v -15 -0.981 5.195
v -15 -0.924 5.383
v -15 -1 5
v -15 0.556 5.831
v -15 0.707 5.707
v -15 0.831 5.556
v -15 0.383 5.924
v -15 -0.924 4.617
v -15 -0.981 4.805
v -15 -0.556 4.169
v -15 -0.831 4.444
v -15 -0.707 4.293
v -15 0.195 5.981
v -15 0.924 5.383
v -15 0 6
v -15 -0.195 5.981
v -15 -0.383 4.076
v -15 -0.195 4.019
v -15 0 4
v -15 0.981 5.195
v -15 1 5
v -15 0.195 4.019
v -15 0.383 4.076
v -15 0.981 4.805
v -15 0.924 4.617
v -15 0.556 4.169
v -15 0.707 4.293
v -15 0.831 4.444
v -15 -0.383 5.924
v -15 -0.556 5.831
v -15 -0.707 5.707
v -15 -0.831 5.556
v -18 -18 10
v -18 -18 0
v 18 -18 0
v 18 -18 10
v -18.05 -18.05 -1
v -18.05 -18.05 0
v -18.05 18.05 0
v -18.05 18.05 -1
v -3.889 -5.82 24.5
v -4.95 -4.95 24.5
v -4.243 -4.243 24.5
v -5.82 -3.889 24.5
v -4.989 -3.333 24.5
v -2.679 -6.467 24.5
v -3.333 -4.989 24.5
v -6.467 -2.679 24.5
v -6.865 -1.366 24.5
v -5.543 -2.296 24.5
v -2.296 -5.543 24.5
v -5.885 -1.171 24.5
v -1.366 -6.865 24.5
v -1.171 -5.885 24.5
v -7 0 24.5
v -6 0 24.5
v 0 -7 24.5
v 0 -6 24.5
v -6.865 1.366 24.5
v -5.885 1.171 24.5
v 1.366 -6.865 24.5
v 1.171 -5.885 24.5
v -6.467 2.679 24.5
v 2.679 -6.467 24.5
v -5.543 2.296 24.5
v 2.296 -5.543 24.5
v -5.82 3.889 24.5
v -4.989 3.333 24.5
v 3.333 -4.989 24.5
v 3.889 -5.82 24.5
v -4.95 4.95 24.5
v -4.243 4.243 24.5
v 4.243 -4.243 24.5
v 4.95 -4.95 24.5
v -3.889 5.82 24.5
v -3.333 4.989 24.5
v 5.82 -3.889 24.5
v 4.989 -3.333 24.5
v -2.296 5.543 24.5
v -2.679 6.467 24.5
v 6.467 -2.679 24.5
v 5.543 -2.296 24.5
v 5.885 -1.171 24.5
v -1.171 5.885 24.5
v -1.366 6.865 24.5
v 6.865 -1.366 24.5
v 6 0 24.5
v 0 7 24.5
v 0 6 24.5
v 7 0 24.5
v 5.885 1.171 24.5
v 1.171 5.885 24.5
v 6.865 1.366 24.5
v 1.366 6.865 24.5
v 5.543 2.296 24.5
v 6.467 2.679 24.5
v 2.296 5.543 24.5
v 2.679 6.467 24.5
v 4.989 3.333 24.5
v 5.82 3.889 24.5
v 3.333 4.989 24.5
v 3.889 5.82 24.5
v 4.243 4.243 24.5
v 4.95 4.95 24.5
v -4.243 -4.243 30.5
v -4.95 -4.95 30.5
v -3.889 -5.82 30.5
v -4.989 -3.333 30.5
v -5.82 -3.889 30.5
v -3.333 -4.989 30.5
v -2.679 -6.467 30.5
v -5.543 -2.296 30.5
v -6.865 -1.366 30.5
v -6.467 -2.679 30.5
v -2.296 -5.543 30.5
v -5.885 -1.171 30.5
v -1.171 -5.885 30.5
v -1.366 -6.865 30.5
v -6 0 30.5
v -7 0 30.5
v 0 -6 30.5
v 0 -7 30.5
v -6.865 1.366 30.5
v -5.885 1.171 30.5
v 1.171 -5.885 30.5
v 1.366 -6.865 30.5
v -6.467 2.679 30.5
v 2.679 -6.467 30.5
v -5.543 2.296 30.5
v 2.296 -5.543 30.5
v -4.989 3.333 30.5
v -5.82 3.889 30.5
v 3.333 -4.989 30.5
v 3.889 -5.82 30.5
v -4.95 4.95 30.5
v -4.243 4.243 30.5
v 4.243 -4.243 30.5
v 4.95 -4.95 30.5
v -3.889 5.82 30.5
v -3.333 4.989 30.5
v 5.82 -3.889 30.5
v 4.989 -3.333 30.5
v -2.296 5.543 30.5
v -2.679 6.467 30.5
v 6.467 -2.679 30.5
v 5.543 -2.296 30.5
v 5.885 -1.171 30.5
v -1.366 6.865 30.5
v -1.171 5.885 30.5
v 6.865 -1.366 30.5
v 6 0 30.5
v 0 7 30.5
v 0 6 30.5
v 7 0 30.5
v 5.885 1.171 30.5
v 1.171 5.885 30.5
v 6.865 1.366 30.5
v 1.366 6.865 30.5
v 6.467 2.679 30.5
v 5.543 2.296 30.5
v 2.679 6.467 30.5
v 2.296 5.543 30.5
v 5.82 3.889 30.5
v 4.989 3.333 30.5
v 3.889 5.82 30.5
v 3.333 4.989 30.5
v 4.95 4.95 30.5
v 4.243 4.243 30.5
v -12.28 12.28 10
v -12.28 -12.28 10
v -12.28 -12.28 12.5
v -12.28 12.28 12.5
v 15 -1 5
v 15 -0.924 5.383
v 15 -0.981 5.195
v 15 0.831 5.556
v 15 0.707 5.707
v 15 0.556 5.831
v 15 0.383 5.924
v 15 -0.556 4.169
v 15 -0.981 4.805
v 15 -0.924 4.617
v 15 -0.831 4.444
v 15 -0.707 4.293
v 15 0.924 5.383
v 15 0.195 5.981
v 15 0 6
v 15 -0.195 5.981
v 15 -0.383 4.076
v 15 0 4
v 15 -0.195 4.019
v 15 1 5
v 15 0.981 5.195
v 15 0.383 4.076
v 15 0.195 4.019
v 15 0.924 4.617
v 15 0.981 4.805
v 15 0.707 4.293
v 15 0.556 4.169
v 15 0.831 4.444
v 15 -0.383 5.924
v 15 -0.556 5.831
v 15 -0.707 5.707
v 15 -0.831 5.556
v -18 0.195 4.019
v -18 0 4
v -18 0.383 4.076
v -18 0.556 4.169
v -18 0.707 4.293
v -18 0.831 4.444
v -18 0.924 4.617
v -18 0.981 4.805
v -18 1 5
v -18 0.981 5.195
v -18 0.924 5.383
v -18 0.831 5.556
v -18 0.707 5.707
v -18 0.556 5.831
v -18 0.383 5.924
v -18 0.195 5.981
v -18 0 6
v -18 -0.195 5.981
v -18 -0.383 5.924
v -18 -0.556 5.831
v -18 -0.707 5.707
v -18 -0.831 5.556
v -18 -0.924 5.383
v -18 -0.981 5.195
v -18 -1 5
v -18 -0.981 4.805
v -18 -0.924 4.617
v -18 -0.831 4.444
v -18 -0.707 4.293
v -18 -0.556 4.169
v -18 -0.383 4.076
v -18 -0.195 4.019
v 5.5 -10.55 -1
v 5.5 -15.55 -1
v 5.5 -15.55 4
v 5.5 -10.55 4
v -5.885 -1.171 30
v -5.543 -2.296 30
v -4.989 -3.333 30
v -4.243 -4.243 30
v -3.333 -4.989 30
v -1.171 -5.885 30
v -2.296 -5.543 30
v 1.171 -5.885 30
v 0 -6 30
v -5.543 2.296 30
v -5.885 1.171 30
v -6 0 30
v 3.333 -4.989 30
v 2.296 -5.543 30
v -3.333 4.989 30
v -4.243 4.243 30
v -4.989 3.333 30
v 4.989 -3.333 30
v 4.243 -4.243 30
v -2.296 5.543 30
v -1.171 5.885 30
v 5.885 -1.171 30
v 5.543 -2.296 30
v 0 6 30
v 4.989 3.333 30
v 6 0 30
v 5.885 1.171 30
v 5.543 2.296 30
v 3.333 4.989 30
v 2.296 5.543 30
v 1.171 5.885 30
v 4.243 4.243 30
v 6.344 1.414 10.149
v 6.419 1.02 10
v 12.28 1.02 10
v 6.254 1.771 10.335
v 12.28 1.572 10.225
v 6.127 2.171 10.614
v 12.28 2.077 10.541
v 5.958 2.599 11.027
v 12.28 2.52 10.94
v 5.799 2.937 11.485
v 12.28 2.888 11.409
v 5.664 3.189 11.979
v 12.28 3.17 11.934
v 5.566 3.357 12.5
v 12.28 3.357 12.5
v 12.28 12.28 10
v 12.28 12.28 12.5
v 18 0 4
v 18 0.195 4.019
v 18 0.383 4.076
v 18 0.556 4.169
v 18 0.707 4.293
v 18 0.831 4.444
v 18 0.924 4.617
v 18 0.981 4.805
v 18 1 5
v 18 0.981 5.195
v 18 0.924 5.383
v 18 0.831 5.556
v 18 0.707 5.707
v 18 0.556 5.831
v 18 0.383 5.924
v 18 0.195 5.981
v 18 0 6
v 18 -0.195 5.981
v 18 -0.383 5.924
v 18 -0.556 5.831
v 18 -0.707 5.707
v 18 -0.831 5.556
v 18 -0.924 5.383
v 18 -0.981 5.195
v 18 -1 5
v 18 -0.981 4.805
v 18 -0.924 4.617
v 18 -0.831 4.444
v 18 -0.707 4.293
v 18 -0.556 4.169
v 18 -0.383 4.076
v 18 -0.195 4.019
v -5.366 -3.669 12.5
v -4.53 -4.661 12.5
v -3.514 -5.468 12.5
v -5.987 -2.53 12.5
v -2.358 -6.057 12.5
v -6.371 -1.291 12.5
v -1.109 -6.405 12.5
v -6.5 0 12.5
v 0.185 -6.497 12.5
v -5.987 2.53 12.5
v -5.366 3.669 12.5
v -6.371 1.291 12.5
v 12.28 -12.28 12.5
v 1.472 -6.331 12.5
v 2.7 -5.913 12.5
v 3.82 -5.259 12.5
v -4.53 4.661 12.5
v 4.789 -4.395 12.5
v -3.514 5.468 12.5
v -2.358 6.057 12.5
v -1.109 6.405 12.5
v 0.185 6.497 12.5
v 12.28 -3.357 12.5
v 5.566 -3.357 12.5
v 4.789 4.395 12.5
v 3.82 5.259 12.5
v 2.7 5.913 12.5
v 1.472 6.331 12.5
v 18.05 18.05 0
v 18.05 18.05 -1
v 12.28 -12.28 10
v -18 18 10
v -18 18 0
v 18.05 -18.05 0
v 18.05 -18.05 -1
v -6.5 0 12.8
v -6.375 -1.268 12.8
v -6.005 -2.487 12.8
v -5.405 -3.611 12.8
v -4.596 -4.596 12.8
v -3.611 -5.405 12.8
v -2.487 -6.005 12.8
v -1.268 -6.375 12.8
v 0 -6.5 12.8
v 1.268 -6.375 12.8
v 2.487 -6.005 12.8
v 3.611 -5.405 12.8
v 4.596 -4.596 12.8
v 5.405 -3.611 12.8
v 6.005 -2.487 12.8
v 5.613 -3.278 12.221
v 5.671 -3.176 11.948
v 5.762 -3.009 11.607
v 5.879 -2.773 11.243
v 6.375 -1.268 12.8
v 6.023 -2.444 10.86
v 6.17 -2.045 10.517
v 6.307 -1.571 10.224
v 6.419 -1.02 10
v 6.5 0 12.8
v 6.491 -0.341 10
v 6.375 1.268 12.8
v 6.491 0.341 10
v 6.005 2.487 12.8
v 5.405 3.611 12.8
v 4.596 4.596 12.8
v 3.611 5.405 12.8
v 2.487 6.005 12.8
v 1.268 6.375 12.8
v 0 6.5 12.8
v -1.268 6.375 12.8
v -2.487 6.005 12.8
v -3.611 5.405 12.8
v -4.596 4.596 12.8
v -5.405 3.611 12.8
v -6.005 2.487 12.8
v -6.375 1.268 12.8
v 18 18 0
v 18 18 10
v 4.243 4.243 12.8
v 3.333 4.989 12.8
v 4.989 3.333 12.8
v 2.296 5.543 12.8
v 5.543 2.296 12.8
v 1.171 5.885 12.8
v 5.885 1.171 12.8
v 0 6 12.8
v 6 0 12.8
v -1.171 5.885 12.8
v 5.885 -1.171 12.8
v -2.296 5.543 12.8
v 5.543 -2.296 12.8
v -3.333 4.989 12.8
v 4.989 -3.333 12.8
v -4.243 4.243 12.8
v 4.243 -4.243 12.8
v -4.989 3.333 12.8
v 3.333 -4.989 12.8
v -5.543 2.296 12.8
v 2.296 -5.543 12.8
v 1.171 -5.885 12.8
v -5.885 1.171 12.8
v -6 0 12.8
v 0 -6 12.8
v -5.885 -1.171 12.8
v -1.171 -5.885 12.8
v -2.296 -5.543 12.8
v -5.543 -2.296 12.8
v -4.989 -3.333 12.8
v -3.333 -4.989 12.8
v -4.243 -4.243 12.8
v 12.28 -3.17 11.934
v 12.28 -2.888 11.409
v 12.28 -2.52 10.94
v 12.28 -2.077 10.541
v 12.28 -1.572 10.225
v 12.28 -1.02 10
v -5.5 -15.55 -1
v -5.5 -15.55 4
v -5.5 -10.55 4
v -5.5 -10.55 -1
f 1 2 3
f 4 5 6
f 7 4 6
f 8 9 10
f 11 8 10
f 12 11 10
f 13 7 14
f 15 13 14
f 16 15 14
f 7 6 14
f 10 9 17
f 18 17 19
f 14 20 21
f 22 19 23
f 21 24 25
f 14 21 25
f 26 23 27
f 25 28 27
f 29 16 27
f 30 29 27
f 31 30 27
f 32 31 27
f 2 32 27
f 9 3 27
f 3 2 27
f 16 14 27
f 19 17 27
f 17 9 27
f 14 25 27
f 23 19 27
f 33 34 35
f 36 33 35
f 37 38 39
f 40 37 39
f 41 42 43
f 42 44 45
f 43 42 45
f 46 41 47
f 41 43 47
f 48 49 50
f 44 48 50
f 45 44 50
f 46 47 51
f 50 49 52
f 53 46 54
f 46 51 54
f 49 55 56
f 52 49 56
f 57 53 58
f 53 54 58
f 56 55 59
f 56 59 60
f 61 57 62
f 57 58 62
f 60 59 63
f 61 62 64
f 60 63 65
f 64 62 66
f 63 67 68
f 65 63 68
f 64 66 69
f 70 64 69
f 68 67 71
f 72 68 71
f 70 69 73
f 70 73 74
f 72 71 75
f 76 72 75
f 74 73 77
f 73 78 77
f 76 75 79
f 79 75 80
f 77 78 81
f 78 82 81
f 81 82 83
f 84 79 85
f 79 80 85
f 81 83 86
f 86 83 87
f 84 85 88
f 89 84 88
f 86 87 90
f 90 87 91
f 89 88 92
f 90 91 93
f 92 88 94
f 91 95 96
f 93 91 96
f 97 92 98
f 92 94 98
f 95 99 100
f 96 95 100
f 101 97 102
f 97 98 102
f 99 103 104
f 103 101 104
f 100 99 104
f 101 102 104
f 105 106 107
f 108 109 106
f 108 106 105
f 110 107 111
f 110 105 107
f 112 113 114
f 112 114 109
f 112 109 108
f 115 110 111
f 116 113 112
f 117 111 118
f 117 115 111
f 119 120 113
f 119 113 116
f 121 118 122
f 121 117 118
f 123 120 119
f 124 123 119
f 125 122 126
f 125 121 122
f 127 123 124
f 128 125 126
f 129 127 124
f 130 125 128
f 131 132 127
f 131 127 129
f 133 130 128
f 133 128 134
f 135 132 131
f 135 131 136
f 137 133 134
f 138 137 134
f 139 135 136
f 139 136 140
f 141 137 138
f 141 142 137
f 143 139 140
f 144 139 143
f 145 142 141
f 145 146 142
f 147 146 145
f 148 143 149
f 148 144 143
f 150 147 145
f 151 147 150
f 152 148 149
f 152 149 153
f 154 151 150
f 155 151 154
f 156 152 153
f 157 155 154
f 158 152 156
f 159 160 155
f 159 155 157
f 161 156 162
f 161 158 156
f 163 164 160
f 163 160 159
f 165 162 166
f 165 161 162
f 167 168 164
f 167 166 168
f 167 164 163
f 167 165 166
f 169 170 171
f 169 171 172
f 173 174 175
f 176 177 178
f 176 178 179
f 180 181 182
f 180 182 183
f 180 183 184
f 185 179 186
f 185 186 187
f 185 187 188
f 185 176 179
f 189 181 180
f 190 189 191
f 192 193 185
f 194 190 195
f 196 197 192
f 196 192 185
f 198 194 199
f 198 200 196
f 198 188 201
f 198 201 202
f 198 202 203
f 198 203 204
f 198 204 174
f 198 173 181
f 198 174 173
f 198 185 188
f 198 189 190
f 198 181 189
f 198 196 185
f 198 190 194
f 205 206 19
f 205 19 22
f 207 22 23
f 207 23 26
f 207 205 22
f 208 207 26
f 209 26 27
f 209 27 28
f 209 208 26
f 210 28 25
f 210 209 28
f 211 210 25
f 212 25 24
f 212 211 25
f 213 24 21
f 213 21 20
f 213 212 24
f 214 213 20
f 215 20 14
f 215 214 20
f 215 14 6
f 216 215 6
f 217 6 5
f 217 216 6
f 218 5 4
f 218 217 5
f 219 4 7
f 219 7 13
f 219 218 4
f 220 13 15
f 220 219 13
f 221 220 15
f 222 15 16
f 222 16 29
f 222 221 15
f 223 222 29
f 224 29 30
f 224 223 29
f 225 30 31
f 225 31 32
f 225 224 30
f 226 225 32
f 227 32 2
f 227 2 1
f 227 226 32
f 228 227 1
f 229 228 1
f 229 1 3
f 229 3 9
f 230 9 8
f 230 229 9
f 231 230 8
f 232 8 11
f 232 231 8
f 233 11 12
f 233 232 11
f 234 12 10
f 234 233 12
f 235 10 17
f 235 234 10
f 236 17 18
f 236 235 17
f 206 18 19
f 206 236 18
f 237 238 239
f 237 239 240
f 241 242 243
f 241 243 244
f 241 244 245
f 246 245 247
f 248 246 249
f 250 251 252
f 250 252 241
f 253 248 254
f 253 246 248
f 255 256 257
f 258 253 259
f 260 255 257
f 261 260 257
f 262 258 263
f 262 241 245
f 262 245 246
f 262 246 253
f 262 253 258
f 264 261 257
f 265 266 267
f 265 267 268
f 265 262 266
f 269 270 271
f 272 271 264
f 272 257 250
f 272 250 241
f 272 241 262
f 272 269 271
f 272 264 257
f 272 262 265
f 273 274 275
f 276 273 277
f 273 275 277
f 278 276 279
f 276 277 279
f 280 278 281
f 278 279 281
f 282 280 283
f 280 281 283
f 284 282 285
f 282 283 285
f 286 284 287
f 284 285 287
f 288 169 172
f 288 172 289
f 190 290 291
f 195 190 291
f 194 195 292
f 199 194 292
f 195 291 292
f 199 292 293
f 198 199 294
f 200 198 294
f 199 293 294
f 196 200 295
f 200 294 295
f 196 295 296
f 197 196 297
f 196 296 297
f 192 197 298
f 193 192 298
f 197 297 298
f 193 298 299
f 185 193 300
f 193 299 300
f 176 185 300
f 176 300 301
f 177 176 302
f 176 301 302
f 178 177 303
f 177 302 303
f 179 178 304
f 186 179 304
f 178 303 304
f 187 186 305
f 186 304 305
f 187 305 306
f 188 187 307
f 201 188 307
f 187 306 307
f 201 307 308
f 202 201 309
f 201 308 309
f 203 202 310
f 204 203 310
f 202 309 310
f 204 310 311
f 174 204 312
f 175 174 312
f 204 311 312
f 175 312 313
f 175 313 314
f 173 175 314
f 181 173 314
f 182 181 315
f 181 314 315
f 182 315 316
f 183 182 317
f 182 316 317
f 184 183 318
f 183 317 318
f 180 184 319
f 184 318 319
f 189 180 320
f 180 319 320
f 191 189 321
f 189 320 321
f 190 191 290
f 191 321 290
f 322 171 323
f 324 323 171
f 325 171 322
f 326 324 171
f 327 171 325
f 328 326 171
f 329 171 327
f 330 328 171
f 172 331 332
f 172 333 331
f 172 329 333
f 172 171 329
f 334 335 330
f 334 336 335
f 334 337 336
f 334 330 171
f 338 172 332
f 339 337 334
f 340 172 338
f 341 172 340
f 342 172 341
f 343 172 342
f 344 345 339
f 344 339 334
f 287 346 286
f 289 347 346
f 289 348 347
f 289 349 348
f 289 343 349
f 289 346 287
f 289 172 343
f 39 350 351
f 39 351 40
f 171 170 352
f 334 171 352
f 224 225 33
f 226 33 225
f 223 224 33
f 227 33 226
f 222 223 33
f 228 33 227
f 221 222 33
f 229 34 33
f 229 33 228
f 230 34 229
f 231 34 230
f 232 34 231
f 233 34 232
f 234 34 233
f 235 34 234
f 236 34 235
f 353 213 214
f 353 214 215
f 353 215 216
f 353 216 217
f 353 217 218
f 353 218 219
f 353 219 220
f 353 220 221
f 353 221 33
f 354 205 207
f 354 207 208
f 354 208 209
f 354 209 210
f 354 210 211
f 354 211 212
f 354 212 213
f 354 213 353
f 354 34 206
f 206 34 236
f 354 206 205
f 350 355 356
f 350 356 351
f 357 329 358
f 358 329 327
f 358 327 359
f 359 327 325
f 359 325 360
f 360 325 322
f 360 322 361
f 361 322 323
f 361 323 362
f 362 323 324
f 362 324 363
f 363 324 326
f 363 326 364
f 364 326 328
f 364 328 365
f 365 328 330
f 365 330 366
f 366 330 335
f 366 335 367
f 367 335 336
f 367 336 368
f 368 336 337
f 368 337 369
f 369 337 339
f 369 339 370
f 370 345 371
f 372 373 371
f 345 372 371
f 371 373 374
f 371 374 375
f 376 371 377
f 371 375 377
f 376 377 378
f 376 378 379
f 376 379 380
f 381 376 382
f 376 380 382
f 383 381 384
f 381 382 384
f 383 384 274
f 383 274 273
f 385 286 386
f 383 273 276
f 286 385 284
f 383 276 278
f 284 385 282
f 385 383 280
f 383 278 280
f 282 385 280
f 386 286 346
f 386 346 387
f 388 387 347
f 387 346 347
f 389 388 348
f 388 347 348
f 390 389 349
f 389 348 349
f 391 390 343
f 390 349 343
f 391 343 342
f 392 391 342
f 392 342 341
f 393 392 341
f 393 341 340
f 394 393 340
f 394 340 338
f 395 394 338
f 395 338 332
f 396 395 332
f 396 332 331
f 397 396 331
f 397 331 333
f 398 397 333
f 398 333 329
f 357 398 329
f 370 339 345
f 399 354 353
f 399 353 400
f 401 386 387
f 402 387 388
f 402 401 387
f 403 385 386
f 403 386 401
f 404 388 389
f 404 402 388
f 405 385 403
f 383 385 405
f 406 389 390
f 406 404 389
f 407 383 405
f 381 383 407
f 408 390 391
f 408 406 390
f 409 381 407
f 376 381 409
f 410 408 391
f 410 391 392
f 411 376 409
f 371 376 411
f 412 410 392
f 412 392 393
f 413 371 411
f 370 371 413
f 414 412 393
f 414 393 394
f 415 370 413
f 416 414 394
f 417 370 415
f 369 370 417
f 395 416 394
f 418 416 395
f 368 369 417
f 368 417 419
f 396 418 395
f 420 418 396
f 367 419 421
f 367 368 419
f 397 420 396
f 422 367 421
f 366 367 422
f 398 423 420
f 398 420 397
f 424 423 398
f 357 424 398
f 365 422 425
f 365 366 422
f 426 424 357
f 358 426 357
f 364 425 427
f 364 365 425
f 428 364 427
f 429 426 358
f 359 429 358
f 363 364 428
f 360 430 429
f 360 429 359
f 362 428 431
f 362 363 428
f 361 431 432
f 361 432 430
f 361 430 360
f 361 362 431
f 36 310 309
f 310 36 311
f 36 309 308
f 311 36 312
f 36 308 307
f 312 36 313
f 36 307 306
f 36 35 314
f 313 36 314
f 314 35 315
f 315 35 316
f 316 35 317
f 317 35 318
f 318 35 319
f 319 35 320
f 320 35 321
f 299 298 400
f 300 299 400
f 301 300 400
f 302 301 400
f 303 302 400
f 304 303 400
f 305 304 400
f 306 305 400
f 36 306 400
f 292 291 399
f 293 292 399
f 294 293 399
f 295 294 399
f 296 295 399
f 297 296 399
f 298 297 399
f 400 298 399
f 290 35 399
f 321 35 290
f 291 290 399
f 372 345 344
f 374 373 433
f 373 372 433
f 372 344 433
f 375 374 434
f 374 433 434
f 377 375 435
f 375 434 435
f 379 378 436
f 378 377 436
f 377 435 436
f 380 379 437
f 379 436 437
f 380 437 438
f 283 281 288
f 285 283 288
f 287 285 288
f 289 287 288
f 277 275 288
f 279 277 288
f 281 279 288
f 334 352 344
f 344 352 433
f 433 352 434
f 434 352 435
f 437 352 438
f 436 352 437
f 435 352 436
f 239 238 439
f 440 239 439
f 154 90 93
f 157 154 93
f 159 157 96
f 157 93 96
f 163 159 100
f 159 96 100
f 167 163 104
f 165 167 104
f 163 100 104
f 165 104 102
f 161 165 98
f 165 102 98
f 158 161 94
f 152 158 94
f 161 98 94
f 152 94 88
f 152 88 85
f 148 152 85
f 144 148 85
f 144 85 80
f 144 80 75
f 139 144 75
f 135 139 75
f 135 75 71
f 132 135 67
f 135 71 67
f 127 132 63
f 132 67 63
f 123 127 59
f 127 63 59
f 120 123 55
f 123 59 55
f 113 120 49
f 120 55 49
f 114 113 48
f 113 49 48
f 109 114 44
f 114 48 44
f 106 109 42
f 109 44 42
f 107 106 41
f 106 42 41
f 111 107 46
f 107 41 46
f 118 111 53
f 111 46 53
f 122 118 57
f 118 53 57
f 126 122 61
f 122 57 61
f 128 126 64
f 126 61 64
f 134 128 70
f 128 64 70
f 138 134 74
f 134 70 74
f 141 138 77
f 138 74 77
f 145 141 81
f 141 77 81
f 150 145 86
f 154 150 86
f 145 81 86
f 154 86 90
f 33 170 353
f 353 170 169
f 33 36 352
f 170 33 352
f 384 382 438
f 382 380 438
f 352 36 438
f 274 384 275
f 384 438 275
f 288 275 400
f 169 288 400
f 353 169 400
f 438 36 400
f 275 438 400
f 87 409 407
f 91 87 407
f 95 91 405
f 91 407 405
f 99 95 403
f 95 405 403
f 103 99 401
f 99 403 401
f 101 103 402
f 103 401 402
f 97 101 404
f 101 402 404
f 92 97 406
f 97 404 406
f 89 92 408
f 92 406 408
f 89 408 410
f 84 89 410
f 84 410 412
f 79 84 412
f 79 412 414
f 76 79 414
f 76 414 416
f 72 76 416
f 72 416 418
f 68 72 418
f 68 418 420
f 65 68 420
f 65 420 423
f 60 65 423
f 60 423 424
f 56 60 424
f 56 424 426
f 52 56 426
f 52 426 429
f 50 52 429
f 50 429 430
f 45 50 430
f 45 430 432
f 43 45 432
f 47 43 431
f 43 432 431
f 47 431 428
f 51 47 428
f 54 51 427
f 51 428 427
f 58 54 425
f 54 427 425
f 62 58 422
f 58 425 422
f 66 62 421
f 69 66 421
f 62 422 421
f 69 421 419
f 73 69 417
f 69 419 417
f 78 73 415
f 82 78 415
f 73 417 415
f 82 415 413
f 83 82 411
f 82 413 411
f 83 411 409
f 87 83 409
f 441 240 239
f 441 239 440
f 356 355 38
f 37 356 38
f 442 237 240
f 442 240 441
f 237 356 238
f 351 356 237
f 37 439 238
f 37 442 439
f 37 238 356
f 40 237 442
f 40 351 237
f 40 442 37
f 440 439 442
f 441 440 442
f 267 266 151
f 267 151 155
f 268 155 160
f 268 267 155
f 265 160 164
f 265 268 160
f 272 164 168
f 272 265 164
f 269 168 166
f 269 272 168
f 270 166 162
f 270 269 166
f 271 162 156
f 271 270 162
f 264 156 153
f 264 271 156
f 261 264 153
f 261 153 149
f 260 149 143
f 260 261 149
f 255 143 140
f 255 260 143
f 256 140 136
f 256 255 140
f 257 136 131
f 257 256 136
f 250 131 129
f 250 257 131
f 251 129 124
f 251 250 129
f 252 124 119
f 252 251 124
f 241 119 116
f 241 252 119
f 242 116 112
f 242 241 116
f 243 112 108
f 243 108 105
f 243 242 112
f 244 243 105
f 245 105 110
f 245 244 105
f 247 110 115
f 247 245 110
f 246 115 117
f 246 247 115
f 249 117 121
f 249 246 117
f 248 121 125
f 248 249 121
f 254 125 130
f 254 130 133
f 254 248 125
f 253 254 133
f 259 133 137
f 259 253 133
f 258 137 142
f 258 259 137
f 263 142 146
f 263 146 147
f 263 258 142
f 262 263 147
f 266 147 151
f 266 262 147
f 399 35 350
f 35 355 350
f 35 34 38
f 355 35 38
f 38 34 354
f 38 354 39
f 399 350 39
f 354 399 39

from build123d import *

# Parameters (mm, degrees)
SKETCH_1_W               = 36
SKETCH_1_H               = 36
EXTRUDE_1_DEPTH          = 10
SKETCH_2_W               = 24.56
SKETCH_2_H               = 24.56
EXTRUDE_2_DEPTH          = 2.5
SKETCH_3_R               = 6
EXTRUDE_3_DEPTH          = 12
SKETCH_4_R               = 7
EXTRUDE_4_DEPTH          = 6
CUT_EXTRUDE_START        = -0.5
SKETCH_5_R               = 6
CUT_EXTRUDE_1_DEPTH      = 0.5
SKETCH_7_R               = 6.5
EXTRUDE_5_DEPTH          = 0.3
CUT_EXTRUDE_2_REACH      = 48.595
CUT_EXTRUDE_2_END_RADIUS = 6.5
SKETCH_10_R              = 1
CUT_EXTRUDE_3_DEPTH      = 3
SKETCH_11_W              = 36.1
SKETCH_11_H              = 36.1
EXTRUDE_6_DEPTH          = 1
SKETCH_12_W              = 11
SKETCH_12_H              = 5
CUT_EXTRUDE_4_DEPTH      = 5


with BuildPart() as part:
    # 草图1 → 凸台-拉伸1 (new body)
    with BuildSketch(Plane.XY):
        Rectangle(SKETCH_1_W, SKETCH_1_H)
    extrude(amount=EXTRUDE_1_DEPTH)

    # 草图2 → 凸台-拉伸2 (add)
    with BuildSketch(Plane.XY.offset(10)):
        Rectangle(SKETCH_2_W, SKETCH_2_H)
    extrude(amount=EXTRUDE_2_DEPTH)

    # 草图3 → 凸台-拉伸3 (add)
    with BuildSketch(Plane.XY.offset(12.5)):
        Circle(SKETCH_3_R)
    extrude(amount=EXTRUDE_3_DEPTH)

    # 草图4 → 凸台-拉伸4 (add)
    with BuildSketch(Plane.XY.offset(24.5)):
        Circle(SKETCH_4_R)
    extrude(amount=EXTRUDE_4_DEPTH)

    # 草图5 → 切除-拉伸1 (cut)
    with BuildSketch(Plane.XY.offset(30.5).offset(CUT_EXTRUDE_START)):
        Circle(SKETCH_5_R)
    extrude(amount=CUT_EXTRUDE_1_DEPTH, mode=Mode.SUBTRACT)

    # 草图7 → 凸台-拉伸5 (add)
    with BuildSketch(Plane.XY.offset(12.5)):
        with Locations(Location((0, 0, 0), (0, 0, 180))):
            Circle(SKETCH_7_R)
    extrude(amount=EXTRUDE_5_DEPTH)

    # 切除-拉伸2: up to this cylinder (the profile starts outside it)
    cut_extrude_2_end = Plane(origin=(0, 0, 11.416503), z_dir=(0, 0, -1)) * Cylinder(CUT_EXTRUDE_2_END_RADIUS, 111.19, mode=Mode.PRIVATE)
    # 草图9 → 切除-拉伸2 (cut, up to the surface)
    with BuildSketch(Plane(origin=(12.28, 0, 0), x_dir=(0, 0, -1), z_dir=(1, 0, 0)), mode=Mode.PRIVATE) as cut_extrude_2_sk1:
        with BuildLine():
            Line((-10, -1.020232895), (-10, 1.020232895))
            ThreePointArc((-10, 1.020232895), (-10.939857211, 2.52041951), (-12.5, 3.35698746))
            Line((-12.5, 3.35698746), (-12.5, -3.35698746))
            ThreePointArc((-12.5, -3.35698746), (-10.939857211, -2.52041951), (-10, -1.020232895))
        make_face()
    cut_extrude_2_tool1 = extrude(cut_extrude_2_sk1.sketch, amount=-CUT_EXTRUDE_2_REACH, mode=Mode.PRIVATE) - cut_extrude_2_end
    add(cut_extrude_2_tool1.solids().sort_by_distance((12.28, 0, 11.416503))[0], mode=Mode.SUBTRACT)

    # 草图10 → 切除-拉伸3 (cut)
    with BuildSketch(Plane(origin=(18, 0, 0), x_dir=(0, 0, -1), z_dir=(1, 0, 0))):
        with Locations((-5, 0)):
            Circle(SKETCH_10_R)
    cut_extrude_3 = extrude(amount=-CUT_EXTRUDE_3_DEPTH, mode=Mode.SUBTRACT)

    # 镜向1: 切除-拉伸3 across plane
    add(cut_extrude_3.mirror(Plane(origin=(0, 0, 0), x_dir=(0, 0, 1), z_dir=(1, 0, 0))), mode=Mode.SUBTRACT)

    # 草图11 → 凸台-拉伸6 (add)
    with BuildSketch(Plane(origin=(0, 0, 0), x_dir=(-1, 0, 0), z_dir=(0, 0, -1))):
        Rectangle(SKETCH_11_W, SKETCH_11_H)
    extrude(amount=EXTRUDE_6_DEPTH)

    # 草图12 → 切除-拉伸4 (cut)
    with BuildSketch(Plane(origin=(0, 0, -1), x_dir=(-1, 0, 0), z_dir=(0, 0, -1))):
        with Locations((0, -13.05)):
            Rectangle(SKETCH_12_W, SKETCH_12_H)
    extrude(amount=-CUT_EXTRUDE_4_DEPTH, mode=Mode.SUBTRACT)


solid = part.part
